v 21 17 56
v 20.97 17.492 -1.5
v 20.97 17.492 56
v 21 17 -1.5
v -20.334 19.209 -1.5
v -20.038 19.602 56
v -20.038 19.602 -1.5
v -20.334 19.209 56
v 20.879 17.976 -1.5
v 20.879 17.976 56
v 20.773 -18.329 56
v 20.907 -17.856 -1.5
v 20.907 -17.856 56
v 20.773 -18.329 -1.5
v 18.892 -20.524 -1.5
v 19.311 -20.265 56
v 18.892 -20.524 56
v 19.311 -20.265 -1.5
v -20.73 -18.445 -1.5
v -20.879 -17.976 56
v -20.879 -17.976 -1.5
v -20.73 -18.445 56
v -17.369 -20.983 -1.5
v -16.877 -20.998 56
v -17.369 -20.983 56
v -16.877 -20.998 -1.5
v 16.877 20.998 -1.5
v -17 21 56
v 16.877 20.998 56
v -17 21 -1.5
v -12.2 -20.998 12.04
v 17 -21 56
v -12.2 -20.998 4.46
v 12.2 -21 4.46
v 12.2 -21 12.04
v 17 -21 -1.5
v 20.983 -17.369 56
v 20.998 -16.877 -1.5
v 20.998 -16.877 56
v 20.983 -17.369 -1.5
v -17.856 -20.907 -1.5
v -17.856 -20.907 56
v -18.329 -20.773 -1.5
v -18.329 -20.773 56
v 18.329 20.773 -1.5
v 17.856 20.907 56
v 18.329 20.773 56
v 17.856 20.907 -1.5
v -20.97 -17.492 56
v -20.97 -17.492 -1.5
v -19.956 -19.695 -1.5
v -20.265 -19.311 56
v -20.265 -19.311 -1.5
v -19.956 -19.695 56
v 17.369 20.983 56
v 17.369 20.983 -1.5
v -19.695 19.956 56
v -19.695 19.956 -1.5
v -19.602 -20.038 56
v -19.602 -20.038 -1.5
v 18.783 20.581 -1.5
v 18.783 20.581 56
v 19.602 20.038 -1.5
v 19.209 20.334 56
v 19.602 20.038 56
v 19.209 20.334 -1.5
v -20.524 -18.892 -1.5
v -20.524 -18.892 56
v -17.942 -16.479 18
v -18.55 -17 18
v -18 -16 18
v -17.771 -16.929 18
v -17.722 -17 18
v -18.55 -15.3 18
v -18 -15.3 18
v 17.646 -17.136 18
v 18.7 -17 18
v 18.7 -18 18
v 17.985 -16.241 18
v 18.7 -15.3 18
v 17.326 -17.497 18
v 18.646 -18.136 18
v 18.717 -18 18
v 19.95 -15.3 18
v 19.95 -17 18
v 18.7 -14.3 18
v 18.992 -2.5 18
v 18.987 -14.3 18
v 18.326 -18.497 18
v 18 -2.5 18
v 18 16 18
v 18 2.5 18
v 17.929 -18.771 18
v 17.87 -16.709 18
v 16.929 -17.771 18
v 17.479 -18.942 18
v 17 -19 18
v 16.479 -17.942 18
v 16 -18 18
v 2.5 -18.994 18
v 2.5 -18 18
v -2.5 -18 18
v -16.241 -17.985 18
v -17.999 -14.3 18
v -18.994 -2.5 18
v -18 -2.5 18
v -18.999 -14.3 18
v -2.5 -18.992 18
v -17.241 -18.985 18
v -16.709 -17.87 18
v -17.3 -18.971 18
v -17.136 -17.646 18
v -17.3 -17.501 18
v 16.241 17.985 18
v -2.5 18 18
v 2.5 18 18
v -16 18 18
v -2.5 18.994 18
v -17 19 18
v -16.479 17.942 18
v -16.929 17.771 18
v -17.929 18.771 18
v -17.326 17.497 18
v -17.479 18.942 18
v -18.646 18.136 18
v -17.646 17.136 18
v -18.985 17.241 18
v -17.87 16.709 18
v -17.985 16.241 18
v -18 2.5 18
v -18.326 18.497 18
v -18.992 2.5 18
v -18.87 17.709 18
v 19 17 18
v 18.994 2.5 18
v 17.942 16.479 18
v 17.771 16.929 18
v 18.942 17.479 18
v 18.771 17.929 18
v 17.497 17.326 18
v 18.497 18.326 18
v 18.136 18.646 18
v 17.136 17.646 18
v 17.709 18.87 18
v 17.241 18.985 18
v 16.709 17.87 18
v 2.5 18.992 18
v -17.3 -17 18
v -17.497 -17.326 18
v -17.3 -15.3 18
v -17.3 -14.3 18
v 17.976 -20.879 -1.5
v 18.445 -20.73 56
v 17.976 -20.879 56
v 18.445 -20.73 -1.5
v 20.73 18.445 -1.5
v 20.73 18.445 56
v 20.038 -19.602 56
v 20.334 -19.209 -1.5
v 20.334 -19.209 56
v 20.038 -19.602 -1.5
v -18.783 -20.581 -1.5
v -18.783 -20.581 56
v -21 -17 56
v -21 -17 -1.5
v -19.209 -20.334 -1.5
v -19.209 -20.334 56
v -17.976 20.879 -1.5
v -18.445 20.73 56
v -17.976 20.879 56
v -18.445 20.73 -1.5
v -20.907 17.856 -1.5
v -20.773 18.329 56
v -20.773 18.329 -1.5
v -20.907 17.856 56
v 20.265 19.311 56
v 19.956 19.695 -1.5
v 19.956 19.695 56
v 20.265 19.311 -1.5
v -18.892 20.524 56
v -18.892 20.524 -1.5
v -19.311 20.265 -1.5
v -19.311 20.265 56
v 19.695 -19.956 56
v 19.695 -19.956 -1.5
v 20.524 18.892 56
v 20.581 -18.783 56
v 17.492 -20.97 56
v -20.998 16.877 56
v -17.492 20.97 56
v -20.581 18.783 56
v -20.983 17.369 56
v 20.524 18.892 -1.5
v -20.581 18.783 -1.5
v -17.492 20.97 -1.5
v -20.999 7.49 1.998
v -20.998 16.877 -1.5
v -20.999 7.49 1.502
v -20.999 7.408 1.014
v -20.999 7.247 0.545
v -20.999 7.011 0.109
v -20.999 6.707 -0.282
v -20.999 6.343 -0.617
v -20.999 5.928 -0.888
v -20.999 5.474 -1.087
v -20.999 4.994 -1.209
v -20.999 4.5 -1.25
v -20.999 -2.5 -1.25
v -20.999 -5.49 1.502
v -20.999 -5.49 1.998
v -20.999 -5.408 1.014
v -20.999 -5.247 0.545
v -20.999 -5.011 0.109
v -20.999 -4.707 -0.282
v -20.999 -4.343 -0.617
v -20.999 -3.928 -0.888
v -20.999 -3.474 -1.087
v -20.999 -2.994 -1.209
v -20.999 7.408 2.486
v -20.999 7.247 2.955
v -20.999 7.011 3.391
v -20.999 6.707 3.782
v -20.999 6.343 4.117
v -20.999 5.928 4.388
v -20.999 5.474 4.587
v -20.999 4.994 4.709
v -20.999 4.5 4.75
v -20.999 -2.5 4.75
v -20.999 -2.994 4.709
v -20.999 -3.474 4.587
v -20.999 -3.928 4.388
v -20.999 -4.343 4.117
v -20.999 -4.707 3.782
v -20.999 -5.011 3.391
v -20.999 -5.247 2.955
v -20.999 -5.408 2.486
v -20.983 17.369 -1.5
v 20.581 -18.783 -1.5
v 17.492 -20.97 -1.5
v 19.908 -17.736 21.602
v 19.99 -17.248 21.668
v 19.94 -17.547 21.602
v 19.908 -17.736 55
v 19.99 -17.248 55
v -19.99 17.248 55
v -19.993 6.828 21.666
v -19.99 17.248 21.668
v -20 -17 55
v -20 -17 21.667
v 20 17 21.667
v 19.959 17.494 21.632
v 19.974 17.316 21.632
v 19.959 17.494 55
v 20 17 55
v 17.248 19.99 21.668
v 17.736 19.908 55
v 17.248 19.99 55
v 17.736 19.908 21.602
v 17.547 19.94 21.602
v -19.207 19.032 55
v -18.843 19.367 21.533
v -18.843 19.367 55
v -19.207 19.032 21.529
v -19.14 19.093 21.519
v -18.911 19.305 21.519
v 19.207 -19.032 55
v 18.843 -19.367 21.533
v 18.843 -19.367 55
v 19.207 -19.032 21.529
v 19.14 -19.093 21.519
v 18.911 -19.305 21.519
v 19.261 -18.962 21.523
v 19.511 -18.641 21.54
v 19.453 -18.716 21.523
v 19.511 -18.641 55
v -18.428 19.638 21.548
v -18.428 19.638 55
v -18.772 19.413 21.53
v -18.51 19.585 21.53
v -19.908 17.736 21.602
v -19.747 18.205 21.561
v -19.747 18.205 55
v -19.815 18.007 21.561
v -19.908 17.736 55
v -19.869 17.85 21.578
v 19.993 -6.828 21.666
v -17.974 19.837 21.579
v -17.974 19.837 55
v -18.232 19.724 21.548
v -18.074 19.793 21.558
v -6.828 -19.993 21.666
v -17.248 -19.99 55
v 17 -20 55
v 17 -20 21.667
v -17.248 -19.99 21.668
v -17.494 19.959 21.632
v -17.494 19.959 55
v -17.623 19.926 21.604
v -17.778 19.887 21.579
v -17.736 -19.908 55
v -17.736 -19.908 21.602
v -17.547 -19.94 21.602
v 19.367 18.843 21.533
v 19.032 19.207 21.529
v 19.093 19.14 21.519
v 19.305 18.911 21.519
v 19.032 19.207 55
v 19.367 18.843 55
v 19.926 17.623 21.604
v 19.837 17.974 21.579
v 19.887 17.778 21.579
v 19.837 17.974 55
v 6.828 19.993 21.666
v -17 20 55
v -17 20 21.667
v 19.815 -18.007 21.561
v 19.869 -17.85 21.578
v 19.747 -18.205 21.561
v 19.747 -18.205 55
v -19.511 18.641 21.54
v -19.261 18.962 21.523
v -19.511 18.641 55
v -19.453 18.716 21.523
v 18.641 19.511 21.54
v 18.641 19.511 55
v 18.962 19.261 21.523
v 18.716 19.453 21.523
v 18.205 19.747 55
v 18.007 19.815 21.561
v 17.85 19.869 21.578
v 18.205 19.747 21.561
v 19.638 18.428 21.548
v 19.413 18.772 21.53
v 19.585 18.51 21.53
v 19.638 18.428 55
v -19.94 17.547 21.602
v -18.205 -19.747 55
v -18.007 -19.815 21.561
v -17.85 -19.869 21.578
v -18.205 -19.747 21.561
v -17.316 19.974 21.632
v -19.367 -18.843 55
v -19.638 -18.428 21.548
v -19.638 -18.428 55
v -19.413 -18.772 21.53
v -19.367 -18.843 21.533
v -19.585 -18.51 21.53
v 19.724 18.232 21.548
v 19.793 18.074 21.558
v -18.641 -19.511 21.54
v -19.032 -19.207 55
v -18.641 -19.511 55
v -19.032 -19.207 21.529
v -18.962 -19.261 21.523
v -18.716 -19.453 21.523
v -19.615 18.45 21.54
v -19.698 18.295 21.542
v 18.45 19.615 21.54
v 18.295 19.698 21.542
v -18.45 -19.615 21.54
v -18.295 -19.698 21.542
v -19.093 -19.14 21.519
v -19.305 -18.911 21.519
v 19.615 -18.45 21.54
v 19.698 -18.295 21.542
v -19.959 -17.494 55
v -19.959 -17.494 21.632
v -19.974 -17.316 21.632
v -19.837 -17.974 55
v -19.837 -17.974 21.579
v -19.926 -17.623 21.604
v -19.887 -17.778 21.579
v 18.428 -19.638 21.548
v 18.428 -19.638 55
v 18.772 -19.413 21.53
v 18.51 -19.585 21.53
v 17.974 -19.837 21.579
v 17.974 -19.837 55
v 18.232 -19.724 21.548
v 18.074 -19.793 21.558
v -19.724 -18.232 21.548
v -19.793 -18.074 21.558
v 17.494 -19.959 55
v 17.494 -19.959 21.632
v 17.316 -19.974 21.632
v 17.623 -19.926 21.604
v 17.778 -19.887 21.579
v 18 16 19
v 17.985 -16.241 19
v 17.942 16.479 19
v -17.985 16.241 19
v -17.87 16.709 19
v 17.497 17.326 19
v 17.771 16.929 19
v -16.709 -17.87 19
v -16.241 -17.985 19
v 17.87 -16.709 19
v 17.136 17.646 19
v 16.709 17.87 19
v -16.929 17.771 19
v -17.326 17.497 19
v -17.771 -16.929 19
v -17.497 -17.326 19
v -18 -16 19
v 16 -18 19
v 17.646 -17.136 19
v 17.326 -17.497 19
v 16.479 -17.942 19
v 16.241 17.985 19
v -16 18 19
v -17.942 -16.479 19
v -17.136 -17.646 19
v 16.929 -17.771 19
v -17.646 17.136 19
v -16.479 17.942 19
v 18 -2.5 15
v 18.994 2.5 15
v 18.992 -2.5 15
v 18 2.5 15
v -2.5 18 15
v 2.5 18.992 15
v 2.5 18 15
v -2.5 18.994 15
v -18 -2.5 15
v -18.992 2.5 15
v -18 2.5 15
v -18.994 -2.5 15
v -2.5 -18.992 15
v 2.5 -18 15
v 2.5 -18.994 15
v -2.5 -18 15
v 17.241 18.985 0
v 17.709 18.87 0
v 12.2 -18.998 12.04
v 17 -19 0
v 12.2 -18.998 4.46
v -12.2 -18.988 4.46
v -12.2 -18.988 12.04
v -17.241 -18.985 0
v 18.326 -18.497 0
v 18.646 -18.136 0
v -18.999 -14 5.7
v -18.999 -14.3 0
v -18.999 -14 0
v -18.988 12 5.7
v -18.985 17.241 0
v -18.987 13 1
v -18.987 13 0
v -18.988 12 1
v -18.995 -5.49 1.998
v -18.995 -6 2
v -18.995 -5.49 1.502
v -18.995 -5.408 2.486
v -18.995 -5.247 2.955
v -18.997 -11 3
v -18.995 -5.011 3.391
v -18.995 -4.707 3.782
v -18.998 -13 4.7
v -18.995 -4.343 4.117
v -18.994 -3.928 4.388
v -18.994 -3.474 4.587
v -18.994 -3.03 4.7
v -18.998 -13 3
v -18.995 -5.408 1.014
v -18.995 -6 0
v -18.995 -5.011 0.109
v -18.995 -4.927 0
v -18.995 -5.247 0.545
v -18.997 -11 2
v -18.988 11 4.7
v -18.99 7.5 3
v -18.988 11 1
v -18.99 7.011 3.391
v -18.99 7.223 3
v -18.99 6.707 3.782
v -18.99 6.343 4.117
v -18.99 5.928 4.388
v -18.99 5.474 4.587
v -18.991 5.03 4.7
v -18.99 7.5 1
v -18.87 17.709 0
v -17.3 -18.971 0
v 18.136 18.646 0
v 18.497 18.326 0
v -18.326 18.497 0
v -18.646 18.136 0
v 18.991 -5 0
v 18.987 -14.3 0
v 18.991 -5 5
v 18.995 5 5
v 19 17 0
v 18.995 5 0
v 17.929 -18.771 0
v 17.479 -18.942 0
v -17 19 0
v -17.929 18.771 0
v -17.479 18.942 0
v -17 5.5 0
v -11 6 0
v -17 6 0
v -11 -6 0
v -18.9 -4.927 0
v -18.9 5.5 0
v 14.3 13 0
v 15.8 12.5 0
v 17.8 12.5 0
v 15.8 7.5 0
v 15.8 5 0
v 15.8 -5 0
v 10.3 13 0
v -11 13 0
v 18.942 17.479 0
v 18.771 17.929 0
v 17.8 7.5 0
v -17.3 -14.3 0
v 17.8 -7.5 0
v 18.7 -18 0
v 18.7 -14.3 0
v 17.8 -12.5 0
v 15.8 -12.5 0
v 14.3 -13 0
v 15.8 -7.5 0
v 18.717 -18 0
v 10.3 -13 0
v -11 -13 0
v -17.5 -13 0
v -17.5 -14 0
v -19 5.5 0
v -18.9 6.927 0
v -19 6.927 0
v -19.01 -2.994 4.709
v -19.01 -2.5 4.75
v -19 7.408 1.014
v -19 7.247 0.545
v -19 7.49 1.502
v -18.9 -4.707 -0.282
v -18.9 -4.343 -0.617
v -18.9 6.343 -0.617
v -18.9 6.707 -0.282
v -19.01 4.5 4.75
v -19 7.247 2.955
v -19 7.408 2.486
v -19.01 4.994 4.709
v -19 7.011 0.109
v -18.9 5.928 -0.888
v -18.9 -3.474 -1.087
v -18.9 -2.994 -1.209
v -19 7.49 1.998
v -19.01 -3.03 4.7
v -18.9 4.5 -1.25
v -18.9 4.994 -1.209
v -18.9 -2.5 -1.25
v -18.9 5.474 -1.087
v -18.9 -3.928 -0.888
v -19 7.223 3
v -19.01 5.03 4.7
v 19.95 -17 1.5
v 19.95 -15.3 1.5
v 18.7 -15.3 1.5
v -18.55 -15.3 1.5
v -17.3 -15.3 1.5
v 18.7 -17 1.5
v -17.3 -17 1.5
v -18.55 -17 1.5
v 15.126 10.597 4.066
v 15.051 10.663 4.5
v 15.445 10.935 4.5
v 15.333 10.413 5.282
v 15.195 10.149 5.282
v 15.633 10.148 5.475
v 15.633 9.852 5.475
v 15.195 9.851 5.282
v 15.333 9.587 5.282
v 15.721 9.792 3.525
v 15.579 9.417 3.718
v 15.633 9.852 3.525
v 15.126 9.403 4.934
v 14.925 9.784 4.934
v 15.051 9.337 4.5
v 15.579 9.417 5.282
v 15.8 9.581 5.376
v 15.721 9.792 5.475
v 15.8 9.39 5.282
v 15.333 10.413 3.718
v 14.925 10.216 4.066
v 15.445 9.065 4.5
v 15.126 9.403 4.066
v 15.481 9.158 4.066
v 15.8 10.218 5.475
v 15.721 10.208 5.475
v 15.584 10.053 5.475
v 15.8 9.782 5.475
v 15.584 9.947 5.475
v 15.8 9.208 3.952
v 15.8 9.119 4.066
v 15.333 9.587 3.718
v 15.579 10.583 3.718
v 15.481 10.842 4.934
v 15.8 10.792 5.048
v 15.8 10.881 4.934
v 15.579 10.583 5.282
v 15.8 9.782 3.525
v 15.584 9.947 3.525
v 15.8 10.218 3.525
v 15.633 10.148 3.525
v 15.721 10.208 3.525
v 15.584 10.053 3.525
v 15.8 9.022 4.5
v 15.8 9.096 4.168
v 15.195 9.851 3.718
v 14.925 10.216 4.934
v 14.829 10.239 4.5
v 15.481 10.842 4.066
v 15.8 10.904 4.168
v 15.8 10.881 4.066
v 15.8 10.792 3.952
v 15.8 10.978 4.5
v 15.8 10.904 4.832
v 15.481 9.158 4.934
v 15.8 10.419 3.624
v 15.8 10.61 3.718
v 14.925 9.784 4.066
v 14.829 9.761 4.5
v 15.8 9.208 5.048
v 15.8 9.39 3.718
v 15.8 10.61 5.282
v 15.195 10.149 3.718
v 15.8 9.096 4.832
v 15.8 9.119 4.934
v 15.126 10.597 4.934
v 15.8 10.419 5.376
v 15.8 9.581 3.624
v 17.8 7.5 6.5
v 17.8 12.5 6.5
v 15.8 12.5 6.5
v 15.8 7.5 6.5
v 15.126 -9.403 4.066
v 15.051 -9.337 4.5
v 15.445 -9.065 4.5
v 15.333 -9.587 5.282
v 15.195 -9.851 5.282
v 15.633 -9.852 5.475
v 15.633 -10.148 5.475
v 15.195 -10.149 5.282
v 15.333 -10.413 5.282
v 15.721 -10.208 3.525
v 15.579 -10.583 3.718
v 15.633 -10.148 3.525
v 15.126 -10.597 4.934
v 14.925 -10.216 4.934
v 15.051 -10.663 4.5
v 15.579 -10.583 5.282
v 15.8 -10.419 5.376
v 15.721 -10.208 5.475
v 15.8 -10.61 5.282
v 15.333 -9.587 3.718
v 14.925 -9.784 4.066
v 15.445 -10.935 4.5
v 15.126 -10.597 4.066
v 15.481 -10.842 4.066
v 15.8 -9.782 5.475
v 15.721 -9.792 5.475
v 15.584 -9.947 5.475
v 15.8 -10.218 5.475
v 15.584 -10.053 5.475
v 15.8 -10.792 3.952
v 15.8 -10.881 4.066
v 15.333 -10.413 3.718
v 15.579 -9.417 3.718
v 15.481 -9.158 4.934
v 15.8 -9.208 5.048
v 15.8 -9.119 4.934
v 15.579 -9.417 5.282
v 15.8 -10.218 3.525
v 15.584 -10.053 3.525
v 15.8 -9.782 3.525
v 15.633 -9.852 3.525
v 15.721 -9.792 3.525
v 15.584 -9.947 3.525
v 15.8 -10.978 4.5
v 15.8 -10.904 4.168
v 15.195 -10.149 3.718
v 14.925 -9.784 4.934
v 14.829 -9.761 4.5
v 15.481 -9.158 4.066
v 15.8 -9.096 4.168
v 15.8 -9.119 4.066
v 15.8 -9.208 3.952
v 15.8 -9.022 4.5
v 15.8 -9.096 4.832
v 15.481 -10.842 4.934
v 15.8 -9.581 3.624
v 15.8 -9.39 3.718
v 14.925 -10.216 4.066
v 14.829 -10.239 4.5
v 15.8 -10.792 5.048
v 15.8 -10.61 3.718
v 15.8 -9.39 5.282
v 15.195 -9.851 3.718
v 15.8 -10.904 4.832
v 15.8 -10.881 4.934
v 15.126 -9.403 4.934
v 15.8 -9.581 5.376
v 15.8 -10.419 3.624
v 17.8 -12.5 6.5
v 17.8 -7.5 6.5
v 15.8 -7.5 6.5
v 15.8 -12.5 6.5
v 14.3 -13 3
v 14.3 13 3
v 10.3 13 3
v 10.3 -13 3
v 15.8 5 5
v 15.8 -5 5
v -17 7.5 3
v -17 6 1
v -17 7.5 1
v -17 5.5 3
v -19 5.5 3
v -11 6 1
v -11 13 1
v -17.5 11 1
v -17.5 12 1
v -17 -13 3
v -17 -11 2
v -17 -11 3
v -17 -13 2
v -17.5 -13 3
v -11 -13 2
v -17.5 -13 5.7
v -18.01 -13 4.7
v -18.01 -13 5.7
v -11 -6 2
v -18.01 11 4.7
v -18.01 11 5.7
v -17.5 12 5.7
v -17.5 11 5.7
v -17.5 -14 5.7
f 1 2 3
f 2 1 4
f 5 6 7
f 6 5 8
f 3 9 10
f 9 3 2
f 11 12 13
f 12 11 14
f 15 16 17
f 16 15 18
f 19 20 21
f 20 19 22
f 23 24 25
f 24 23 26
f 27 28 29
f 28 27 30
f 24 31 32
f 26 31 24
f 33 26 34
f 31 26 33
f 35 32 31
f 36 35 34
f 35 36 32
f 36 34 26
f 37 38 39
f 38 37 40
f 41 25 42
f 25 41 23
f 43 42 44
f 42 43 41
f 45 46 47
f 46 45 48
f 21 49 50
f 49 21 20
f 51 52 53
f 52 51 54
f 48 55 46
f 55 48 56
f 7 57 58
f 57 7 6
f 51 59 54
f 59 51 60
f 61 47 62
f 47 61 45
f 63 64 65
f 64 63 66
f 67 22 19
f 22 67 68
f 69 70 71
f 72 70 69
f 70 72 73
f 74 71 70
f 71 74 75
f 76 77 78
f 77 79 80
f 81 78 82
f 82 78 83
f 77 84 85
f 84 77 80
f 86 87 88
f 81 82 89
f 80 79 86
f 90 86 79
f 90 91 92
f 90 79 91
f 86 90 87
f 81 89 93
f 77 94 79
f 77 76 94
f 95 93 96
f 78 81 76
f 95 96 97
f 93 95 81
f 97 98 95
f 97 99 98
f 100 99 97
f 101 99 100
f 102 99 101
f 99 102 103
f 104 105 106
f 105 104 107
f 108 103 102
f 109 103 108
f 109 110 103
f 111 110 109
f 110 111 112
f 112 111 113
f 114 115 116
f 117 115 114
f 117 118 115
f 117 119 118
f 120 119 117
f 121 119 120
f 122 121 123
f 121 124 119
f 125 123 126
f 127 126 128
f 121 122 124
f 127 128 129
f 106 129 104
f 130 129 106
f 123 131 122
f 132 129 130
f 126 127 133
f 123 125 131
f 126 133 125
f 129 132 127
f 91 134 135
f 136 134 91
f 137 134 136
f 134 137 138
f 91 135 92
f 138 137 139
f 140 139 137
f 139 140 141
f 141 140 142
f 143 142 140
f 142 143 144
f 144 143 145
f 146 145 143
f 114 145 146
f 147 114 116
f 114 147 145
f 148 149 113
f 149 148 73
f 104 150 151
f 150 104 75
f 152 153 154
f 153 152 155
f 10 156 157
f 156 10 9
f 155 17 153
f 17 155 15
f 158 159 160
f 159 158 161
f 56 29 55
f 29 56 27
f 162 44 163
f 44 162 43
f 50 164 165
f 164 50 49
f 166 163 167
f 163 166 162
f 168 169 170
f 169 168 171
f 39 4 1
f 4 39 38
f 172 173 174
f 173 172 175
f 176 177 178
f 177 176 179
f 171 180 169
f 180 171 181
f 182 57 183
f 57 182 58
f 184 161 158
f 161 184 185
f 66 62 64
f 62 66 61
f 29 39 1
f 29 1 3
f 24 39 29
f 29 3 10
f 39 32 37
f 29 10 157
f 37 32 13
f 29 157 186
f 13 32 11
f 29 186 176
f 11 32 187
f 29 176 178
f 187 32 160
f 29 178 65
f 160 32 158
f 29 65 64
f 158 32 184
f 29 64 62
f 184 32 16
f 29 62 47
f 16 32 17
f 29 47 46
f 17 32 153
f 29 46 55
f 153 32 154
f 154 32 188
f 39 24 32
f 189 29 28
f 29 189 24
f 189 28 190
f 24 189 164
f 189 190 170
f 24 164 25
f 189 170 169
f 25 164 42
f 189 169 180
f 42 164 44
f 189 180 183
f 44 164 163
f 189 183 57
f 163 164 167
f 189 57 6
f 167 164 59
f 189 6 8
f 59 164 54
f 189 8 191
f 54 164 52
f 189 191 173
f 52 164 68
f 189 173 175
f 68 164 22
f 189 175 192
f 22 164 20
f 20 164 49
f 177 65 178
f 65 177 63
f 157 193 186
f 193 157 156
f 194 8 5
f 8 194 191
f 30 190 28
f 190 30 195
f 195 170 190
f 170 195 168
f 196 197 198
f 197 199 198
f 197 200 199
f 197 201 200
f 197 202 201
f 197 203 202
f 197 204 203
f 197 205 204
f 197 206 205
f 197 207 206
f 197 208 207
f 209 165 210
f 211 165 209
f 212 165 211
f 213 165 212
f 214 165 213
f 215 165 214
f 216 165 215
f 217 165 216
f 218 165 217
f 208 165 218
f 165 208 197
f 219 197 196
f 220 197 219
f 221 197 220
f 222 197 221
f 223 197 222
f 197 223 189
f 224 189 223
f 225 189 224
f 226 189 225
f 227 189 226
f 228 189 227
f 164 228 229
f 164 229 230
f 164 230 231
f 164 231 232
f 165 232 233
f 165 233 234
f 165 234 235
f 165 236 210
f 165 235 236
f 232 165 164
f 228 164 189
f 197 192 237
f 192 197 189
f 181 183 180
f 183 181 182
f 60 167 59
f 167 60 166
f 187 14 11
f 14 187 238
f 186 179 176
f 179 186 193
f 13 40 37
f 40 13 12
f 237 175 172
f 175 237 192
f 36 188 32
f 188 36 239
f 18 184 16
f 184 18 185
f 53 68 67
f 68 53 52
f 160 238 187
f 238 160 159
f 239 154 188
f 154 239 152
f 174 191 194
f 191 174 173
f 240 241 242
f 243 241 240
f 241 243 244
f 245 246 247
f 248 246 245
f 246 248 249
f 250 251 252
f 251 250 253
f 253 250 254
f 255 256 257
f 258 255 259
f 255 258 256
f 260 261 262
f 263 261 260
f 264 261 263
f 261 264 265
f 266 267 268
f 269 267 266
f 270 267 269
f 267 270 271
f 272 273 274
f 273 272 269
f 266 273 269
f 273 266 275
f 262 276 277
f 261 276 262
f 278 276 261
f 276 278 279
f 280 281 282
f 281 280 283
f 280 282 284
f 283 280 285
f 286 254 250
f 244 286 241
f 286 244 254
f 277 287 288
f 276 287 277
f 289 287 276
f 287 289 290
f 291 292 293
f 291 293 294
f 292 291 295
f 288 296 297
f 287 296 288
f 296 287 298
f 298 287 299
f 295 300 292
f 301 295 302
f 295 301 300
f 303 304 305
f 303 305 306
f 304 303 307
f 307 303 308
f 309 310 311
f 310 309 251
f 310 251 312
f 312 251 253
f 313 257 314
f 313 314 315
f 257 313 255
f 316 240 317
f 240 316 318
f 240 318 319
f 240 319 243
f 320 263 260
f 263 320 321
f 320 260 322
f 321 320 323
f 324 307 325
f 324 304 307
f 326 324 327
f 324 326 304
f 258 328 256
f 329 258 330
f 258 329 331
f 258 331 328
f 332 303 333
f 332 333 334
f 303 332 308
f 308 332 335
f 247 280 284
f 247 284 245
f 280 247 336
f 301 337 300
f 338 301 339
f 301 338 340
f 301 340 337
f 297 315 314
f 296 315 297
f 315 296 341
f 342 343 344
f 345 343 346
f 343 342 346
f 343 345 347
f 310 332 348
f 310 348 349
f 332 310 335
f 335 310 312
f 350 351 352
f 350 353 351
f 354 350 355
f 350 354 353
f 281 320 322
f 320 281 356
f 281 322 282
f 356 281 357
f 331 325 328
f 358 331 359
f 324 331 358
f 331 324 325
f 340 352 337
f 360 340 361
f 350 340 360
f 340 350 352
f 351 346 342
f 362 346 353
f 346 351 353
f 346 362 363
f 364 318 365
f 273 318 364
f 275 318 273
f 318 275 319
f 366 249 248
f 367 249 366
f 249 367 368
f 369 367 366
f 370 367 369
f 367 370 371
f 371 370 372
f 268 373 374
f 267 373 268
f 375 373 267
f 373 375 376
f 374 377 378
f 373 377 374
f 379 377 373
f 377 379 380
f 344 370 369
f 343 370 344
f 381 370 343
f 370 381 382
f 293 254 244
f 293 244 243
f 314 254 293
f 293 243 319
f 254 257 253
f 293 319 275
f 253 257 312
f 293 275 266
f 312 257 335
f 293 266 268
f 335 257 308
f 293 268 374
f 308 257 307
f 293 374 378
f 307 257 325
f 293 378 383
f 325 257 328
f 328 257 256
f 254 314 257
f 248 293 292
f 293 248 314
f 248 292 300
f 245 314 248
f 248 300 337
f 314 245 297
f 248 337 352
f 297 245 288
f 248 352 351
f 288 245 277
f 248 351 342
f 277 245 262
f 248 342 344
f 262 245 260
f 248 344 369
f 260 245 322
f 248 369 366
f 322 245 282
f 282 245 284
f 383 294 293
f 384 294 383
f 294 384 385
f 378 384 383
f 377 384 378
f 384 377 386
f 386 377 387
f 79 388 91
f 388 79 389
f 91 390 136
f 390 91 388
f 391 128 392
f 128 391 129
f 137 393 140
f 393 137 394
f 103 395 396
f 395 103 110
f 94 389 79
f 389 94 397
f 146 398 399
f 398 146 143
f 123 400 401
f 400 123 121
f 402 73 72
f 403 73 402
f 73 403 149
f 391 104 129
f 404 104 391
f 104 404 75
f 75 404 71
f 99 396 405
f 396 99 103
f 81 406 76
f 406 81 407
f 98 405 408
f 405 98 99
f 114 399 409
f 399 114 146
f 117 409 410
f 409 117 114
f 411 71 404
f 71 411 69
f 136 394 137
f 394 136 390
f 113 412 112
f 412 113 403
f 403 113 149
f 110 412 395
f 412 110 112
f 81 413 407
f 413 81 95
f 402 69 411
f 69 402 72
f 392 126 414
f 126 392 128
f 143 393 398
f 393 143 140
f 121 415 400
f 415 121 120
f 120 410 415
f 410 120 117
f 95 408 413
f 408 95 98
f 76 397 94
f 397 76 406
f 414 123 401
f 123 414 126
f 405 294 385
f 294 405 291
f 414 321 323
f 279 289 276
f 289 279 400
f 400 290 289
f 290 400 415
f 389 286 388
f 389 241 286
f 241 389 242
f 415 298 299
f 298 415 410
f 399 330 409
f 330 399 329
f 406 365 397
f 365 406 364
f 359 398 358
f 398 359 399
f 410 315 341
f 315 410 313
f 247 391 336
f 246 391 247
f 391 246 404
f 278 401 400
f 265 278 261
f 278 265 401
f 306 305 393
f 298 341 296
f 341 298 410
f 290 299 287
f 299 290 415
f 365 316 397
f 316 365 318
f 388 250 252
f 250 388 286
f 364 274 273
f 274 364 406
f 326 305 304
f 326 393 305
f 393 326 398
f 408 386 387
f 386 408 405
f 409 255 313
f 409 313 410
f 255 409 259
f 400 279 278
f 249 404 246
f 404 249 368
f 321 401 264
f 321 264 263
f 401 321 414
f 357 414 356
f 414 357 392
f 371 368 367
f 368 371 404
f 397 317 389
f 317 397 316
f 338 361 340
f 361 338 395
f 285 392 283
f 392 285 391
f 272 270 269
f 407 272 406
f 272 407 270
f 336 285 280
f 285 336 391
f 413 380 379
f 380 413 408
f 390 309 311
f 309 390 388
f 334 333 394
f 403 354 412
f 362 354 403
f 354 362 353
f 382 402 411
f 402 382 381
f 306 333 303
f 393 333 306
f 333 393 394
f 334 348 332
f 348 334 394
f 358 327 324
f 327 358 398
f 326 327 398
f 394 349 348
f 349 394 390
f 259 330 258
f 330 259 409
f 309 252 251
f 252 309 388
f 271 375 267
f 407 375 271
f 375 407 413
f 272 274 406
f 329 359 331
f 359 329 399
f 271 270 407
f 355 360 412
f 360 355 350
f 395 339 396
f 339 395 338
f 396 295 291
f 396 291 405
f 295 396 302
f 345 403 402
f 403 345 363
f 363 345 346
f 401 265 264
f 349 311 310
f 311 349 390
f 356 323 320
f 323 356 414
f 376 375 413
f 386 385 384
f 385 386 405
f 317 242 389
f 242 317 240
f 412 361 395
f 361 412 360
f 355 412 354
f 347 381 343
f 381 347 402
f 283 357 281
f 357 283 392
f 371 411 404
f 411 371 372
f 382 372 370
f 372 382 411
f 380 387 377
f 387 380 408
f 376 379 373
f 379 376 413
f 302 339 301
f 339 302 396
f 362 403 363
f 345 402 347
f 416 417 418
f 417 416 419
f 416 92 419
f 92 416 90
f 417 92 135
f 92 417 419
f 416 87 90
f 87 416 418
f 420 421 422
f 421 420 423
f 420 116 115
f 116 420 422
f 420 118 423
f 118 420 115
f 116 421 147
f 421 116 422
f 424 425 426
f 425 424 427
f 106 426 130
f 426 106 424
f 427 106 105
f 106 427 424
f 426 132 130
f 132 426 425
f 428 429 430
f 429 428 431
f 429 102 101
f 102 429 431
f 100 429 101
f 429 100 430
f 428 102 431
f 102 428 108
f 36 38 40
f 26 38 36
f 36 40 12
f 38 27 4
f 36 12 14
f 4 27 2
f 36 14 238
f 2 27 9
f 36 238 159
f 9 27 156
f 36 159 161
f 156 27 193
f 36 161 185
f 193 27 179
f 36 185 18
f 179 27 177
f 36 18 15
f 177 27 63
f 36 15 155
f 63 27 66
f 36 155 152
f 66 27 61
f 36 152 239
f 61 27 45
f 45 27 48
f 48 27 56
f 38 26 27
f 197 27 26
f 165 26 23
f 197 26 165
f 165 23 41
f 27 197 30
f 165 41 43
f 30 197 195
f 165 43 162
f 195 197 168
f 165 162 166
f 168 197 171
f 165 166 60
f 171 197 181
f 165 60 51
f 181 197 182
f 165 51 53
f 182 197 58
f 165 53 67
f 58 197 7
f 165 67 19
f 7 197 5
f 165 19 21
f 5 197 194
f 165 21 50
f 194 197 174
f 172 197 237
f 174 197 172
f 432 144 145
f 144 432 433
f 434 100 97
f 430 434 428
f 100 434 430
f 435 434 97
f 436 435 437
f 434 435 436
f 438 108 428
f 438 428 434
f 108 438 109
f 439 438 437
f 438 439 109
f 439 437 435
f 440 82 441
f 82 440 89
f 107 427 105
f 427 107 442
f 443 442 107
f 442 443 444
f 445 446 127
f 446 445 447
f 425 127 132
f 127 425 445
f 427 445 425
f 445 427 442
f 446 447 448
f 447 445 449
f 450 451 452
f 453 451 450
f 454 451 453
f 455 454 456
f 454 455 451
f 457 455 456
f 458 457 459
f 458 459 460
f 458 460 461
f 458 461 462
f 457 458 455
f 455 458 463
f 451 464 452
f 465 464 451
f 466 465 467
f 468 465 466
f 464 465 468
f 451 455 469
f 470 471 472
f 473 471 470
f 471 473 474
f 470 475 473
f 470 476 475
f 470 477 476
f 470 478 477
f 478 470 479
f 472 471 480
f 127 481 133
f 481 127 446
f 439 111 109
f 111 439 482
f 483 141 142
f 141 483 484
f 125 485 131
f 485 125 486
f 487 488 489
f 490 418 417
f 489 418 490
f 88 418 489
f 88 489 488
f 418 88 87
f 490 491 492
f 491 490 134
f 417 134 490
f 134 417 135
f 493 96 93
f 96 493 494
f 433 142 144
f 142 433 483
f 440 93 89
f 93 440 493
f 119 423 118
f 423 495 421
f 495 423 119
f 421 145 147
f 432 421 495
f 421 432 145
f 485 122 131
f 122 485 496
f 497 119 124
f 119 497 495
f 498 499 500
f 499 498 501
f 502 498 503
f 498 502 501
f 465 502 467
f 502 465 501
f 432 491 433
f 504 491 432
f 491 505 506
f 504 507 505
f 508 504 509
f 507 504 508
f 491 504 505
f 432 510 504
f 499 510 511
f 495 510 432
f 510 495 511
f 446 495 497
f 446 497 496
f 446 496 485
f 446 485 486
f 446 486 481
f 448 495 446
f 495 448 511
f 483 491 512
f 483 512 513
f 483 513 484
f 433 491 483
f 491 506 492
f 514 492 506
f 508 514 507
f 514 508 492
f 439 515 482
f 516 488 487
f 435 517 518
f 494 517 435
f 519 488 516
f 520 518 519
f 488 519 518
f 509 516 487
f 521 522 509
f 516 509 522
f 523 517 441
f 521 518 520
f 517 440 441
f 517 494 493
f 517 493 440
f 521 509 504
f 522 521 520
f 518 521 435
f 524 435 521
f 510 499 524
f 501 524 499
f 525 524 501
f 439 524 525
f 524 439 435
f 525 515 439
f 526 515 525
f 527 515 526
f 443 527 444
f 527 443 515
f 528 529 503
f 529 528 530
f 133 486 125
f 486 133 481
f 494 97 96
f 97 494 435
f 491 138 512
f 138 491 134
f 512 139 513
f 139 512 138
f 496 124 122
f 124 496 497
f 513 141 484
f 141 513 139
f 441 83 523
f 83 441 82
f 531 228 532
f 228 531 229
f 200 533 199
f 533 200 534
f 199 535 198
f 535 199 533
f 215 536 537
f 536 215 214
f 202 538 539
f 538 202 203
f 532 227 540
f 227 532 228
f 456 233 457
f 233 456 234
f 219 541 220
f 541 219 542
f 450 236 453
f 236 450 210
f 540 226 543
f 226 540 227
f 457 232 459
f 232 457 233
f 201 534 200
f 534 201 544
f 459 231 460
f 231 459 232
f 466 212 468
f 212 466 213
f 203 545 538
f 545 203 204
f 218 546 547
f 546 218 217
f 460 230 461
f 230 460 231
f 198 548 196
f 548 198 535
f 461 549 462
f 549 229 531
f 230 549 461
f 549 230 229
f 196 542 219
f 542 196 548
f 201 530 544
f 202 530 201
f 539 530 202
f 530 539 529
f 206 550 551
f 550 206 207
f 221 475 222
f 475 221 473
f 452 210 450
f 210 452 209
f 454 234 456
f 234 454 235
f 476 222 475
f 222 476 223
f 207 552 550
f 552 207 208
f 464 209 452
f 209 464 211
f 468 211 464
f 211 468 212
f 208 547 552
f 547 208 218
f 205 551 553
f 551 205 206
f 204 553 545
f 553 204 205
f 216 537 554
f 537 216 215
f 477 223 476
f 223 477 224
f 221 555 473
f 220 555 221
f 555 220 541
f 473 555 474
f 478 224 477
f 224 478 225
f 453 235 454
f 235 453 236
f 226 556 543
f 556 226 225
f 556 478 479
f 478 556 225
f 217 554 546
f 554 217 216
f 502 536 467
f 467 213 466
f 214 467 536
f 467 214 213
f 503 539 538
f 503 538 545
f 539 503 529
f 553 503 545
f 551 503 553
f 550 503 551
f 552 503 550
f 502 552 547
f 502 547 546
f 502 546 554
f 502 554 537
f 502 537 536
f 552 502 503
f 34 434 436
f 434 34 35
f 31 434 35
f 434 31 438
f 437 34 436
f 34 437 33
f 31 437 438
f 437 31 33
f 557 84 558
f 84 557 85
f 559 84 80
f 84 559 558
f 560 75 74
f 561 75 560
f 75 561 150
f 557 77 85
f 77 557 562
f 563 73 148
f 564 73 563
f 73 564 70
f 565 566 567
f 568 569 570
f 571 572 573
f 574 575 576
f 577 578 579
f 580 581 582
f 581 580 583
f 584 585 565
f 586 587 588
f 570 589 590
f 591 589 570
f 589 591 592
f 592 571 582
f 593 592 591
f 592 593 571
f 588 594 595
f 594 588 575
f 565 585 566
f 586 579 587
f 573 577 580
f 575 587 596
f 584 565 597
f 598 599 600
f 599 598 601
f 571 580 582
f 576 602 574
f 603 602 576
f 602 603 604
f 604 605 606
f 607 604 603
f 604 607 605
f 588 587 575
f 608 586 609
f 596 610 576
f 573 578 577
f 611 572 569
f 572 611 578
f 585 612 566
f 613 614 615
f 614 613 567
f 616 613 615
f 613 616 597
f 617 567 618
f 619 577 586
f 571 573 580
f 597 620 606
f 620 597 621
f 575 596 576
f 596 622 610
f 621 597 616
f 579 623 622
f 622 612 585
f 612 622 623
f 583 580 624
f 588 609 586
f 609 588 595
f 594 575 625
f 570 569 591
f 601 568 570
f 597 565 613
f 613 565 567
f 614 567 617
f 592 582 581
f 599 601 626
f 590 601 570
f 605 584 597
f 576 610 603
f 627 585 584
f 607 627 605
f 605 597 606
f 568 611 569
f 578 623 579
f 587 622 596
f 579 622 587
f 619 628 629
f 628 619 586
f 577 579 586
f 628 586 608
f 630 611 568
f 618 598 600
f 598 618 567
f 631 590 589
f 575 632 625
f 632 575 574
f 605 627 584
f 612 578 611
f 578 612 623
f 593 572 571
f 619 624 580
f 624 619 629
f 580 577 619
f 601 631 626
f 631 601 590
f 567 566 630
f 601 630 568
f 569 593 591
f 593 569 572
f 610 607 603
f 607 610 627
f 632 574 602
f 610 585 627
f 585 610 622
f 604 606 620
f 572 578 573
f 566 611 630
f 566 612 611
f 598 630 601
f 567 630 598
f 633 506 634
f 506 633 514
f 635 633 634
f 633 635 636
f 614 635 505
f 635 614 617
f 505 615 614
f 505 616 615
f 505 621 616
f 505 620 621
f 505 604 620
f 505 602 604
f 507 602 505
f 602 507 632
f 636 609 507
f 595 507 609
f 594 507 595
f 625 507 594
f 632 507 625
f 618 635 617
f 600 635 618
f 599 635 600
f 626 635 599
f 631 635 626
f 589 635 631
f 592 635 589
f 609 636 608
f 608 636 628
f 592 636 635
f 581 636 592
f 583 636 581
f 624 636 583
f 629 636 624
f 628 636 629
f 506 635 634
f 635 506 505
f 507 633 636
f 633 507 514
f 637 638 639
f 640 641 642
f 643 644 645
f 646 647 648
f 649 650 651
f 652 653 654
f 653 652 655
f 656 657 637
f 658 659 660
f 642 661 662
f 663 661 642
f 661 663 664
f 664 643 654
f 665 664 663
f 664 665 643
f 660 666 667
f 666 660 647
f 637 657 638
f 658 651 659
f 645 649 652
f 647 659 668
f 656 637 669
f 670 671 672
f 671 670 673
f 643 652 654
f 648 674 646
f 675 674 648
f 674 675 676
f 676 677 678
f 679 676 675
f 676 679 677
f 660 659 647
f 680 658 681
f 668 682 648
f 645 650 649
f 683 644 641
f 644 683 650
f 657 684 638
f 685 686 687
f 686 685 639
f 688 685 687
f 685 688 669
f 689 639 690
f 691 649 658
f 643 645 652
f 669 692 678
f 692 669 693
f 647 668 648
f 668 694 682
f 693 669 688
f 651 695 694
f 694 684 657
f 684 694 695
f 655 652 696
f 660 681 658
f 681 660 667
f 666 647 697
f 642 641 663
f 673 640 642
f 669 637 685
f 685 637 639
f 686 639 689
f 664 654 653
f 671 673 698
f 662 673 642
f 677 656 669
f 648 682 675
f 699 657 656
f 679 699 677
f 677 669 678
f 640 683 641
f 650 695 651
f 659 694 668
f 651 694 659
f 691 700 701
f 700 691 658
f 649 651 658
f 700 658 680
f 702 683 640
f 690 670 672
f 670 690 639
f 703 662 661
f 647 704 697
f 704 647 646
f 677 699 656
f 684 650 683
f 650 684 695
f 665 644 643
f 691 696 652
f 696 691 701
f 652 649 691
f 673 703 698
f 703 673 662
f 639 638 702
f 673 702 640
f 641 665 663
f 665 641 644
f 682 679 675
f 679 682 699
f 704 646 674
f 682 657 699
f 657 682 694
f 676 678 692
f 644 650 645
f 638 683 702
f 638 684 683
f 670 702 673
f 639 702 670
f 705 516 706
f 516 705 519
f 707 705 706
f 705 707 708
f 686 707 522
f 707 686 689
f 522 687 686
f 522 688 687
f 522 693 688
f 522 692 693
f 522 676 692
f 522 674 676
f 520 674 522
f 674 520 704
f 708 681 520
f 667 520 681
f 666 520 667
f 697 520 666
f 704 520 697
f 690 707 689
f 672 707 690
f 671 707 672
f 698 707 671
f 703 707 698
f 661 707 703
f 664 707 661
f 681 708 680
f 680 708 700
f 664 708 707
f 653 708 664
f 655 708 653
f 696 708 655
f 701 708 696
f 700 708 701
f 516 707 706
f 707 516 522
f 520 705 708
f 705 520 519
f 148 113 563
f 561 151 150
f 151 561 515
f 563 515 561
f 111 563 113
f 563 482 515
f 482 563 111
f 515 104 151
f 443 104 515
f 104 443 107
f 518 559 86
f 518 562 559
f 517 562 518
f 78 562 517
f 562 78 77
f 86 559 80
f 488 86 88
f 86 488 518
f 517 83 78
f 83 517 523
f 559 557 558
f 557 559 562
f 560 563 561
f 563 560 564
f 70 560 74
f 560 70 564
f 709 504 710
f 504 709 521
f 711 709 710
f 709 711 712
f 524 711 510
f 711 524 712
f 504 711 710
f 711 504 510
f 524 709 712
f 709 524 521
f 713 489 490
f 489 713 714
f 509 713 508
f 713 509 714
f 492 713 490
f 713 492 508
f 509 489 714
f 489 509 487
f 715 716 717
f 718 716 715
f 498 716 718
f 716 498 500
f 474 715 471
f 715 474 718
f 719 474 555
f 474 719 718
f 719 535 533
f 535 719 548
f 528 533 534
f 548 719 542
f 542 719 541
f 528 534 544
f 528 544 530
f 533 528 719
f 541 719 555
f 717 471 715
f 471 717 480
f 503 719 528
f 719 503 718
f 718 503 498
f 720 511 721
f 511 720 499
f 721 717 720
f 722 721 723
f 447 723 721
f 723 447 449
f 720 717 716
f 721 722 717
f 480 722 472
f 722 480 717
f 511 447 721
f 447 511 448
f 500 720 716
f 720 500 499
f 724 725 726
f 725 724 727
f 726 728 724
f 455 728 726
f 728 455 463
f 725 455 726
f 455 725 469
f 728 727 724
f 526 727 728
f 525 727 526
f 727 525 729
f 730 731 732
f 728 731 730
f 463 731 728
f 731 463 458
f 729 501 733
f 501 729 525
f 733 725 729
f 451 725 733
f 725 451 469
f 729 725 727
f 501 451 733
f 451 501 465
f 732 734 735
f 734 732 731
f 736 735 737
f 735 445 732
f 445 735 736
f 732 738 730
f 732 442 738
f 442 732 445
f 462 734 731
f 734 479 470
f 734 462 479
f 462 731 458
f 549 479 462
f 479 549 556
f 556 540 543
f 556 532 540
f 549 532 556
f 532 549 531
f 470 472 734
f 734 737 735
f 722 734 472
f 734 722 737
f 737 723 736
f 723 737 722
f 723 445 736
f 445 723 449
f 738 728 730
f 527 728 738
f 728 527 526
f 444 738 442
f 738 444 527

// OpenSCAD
side=42;
//diffusorHeight=side; // 42mm
diffusorHeight=side-4; // 38mm
//diffusorHeight=side-7; // 35mm
//diffusorHeight=10; // 10mm
rounding=4;
wall=2;
bottomHeight=18;
$fs=.5;
$fa=3;

/*
translate([0,0,0.1]){color("PaleTurquoise",1){diffusor();}}
color("DarkSlateGray"){bottomPart();}
*/
diffusor();
//diffusorSpreader();
bottomPart();

module diffusorSpreader() {
  y=1/(sin(atan2(side/2-1,diffusorHeight/2)));
  echo(y);
  difference() {
    translate([0,0,bottomHeight+diffusorHeight/2-.5]) {cylinder(r1=0,r2=side/2-1,h=diffusorHeight/2,center=false);}
    translate([0,0,bottomHeight+diffusorHeight/2+y-.5]) {cylinder(r1=0,r2=side/2-1,h=diffusorHeight/2,center=false);}
  }
}

module diffusor() {
    color("LightCyan",1.0){
        // upper hollow
        difference() {
            offset = side/2-rounding;
            hull() { for(a=[0:90:360]) { rotate([0,0,a]) {
                translate([offset,offset,bottomHeight]) {cylinder(r=rounding,h=1,center=false);}
                translate([offset,offset,bottomHeight+diffusorHeight-1]) {cylinder(r=rounding,h=1,center=false);}
            }}}
            hull() { for(a=[0:90:360]) { rotate([0,0,a]) {
                translate([offset,offset,bottomHeight-1]) {cylinder(r=rounding-1,h=1,center=false);}
                translate([offset,offset,bottomHeight-1+diffusorHeight-1]) {cylinder(r=rounding-1,h=1,center=false);}
            }}}
        }
        
        // bottom step
        difference() {
            hull() { for(a=[0:90:360]) { rotate([0,0,a]) {
                offset = side/2-rounding;
                translate([offset,offset,bottomHeight]) {cylinder(r=rounding,h=5,center=false);}
            }}}
            hull() { for(a=[0:90:360]) { rotate([0,0,a]) {
                offset = side/2-3-2;
                translate([offset,offset,bottomHeight-1]) {cylinder(r=2,h=5+2,center=false);}
            }}}
            hull() { for(a=[0:90:360]) { rotate([0,0,a]) {
                offset = side/2-3-2;
                offset2 = side/2-(rounding-1);
                translate([offset,offset,bottomHeight+1]) {cylinder(r=2,h=3+3,center=false);}
                translate([offset2,offset2,bottomHeight+1+4]) {cylinder(r=rounding-1,h=1,center=false);}
            }}}
        }
        
        // Hooks
        for(a=[0:90:360]) { rotate([0,0,a]) {
            translate([side/2-3,-2.5,bottomHeight-3]){cube([1,5,3]);}
            translate([side/2-2,0,bottomHeight-2]){sphere(r=1);}
        }}
    }
}


module bottomPart() {
    color([.2,.2,.2],1.0){

        bWall = 1.5; // floor thickness
        dispBoardWidth=6.11+24.38+7.51;
        
        // upper hollow
        difference() {
            offset = side/2-rounding;
            hull() { for(a=[0:90:360]) { rotate([0,0,a]) {
                translate([offset,offset,-bWall]) {cylinder(r=rounding,h=1,center=false);}
                translate([offset,offset,bottomHeight-1]) {cylinder(r=rounding,h=1,center=false);}
            }}}
            hull() { for(a=[0:90:360]) { rotate([0,0,a]) {
                translate([offset,offset,0]) {cylinder(r=rounding-wall,h=1,center=false);}
                translate([offset,offset,bottomHeight+1]) {cylinder(r=rounding-wall,h=1,center=false);}
            }}}
            
            // Hook holes
            for(a=[0:90:360]) { rotate([0,0,a]) {
                translate([side/2-2,0,bottomHeight-2]){sphere(r=1);}
            }}
            
            // USB plug hole
            hull() {
                translate([-(side/2-wall-.1),7/2+1,3-2.5/2]) {rotate([0,90,180]) {cylinder(d=6,h=wall+1);}}
                translate([-(side/2-wall-.1),-7/2+1,3-2.5/2]) {rotate([0,90,180]) {cylinder(d=6,h=wall+1);}}
            }
            
            // Display hole
            translate([-24.4/2,-(side/2+wall),2.96+1.5]){cube([24.4,3*wall,7.58]);}
            // Dispaly board
            translate([-6.11-24.38/2-0.5/2,-side/2+wall+2,0.01]){cube([dispBoardWidth+.5,1.7,bottomHeight]);}
        }
        
        // Processor board support
        translate([-(side/2-wall)+34.3-5,-26/2,0]){cube([4,26,3]);} // back bottom
        translate([-(side/2-wall)+34.3+.5,-10/2,0]){cube([4,10,5]);} // back back
        translate([-(side/2-wall)+34.3+.5,20/2,0]){hook();} // back hook
        translate([-(side/2-wall)+34.3+.5,-20/2,0]){hook();} // back hook
        translate([-(side/2-wall),26/2-2-5.5,0]){cube([2,2,3]);} // front bottom 1
        translate([-(side/2-wall),26/2-7,0]){cube([8,7,1]);} // front bottom 1.2
        translate([-(side/2-wall),-26/2,0]){cube([2,2,3]);} // front bottom 2
        translate([-(side/2-wall),-26/2,0]){cube([8,7,2]);} // front bottom 2.2
        translate([-(side/2-wall)-0.01,-26/2,3+1.7]){cube([1,26-2,1]);} // front top
        translate([-(side/2-wall),26/2-2,0]){cube([1.5,1,3+1.7+1]);} // front side 1
        translate([-(side/2-wall),-26/2-1,0]){cube([1.5,1,3+1.7+1]);} // front side 2
        
        // Display support
        difference() {
            union() {
                translate([-6.11-24.38/2-1,-side/2+wall+2-2,0]){cube([2,1.7+3,bottomHeight]);}
                translate([24.38/2+7.51-1,-side/2+wall+2-1,0]){cube([2,1.7+2,bottomHeight]);}
            }
            translate([-6.11-24.38/2-0.5/2,-side/2+wall+2,1.5]){cube([dispBoardWidth+.5,1.7,2*bottomHeight]);}
        }
    }
}

module hook() {
    translate([0,-2.5,0]){ // back hook
        cube([2,5,3+1.5+2]);
        translate([0,5/2,3+1+0.5]){
            difference() {
                sphere(r=1,center=true);
                translate([2.01,0,0]){cube([4,4,4],center=true);}
            }
        }
    }
}
